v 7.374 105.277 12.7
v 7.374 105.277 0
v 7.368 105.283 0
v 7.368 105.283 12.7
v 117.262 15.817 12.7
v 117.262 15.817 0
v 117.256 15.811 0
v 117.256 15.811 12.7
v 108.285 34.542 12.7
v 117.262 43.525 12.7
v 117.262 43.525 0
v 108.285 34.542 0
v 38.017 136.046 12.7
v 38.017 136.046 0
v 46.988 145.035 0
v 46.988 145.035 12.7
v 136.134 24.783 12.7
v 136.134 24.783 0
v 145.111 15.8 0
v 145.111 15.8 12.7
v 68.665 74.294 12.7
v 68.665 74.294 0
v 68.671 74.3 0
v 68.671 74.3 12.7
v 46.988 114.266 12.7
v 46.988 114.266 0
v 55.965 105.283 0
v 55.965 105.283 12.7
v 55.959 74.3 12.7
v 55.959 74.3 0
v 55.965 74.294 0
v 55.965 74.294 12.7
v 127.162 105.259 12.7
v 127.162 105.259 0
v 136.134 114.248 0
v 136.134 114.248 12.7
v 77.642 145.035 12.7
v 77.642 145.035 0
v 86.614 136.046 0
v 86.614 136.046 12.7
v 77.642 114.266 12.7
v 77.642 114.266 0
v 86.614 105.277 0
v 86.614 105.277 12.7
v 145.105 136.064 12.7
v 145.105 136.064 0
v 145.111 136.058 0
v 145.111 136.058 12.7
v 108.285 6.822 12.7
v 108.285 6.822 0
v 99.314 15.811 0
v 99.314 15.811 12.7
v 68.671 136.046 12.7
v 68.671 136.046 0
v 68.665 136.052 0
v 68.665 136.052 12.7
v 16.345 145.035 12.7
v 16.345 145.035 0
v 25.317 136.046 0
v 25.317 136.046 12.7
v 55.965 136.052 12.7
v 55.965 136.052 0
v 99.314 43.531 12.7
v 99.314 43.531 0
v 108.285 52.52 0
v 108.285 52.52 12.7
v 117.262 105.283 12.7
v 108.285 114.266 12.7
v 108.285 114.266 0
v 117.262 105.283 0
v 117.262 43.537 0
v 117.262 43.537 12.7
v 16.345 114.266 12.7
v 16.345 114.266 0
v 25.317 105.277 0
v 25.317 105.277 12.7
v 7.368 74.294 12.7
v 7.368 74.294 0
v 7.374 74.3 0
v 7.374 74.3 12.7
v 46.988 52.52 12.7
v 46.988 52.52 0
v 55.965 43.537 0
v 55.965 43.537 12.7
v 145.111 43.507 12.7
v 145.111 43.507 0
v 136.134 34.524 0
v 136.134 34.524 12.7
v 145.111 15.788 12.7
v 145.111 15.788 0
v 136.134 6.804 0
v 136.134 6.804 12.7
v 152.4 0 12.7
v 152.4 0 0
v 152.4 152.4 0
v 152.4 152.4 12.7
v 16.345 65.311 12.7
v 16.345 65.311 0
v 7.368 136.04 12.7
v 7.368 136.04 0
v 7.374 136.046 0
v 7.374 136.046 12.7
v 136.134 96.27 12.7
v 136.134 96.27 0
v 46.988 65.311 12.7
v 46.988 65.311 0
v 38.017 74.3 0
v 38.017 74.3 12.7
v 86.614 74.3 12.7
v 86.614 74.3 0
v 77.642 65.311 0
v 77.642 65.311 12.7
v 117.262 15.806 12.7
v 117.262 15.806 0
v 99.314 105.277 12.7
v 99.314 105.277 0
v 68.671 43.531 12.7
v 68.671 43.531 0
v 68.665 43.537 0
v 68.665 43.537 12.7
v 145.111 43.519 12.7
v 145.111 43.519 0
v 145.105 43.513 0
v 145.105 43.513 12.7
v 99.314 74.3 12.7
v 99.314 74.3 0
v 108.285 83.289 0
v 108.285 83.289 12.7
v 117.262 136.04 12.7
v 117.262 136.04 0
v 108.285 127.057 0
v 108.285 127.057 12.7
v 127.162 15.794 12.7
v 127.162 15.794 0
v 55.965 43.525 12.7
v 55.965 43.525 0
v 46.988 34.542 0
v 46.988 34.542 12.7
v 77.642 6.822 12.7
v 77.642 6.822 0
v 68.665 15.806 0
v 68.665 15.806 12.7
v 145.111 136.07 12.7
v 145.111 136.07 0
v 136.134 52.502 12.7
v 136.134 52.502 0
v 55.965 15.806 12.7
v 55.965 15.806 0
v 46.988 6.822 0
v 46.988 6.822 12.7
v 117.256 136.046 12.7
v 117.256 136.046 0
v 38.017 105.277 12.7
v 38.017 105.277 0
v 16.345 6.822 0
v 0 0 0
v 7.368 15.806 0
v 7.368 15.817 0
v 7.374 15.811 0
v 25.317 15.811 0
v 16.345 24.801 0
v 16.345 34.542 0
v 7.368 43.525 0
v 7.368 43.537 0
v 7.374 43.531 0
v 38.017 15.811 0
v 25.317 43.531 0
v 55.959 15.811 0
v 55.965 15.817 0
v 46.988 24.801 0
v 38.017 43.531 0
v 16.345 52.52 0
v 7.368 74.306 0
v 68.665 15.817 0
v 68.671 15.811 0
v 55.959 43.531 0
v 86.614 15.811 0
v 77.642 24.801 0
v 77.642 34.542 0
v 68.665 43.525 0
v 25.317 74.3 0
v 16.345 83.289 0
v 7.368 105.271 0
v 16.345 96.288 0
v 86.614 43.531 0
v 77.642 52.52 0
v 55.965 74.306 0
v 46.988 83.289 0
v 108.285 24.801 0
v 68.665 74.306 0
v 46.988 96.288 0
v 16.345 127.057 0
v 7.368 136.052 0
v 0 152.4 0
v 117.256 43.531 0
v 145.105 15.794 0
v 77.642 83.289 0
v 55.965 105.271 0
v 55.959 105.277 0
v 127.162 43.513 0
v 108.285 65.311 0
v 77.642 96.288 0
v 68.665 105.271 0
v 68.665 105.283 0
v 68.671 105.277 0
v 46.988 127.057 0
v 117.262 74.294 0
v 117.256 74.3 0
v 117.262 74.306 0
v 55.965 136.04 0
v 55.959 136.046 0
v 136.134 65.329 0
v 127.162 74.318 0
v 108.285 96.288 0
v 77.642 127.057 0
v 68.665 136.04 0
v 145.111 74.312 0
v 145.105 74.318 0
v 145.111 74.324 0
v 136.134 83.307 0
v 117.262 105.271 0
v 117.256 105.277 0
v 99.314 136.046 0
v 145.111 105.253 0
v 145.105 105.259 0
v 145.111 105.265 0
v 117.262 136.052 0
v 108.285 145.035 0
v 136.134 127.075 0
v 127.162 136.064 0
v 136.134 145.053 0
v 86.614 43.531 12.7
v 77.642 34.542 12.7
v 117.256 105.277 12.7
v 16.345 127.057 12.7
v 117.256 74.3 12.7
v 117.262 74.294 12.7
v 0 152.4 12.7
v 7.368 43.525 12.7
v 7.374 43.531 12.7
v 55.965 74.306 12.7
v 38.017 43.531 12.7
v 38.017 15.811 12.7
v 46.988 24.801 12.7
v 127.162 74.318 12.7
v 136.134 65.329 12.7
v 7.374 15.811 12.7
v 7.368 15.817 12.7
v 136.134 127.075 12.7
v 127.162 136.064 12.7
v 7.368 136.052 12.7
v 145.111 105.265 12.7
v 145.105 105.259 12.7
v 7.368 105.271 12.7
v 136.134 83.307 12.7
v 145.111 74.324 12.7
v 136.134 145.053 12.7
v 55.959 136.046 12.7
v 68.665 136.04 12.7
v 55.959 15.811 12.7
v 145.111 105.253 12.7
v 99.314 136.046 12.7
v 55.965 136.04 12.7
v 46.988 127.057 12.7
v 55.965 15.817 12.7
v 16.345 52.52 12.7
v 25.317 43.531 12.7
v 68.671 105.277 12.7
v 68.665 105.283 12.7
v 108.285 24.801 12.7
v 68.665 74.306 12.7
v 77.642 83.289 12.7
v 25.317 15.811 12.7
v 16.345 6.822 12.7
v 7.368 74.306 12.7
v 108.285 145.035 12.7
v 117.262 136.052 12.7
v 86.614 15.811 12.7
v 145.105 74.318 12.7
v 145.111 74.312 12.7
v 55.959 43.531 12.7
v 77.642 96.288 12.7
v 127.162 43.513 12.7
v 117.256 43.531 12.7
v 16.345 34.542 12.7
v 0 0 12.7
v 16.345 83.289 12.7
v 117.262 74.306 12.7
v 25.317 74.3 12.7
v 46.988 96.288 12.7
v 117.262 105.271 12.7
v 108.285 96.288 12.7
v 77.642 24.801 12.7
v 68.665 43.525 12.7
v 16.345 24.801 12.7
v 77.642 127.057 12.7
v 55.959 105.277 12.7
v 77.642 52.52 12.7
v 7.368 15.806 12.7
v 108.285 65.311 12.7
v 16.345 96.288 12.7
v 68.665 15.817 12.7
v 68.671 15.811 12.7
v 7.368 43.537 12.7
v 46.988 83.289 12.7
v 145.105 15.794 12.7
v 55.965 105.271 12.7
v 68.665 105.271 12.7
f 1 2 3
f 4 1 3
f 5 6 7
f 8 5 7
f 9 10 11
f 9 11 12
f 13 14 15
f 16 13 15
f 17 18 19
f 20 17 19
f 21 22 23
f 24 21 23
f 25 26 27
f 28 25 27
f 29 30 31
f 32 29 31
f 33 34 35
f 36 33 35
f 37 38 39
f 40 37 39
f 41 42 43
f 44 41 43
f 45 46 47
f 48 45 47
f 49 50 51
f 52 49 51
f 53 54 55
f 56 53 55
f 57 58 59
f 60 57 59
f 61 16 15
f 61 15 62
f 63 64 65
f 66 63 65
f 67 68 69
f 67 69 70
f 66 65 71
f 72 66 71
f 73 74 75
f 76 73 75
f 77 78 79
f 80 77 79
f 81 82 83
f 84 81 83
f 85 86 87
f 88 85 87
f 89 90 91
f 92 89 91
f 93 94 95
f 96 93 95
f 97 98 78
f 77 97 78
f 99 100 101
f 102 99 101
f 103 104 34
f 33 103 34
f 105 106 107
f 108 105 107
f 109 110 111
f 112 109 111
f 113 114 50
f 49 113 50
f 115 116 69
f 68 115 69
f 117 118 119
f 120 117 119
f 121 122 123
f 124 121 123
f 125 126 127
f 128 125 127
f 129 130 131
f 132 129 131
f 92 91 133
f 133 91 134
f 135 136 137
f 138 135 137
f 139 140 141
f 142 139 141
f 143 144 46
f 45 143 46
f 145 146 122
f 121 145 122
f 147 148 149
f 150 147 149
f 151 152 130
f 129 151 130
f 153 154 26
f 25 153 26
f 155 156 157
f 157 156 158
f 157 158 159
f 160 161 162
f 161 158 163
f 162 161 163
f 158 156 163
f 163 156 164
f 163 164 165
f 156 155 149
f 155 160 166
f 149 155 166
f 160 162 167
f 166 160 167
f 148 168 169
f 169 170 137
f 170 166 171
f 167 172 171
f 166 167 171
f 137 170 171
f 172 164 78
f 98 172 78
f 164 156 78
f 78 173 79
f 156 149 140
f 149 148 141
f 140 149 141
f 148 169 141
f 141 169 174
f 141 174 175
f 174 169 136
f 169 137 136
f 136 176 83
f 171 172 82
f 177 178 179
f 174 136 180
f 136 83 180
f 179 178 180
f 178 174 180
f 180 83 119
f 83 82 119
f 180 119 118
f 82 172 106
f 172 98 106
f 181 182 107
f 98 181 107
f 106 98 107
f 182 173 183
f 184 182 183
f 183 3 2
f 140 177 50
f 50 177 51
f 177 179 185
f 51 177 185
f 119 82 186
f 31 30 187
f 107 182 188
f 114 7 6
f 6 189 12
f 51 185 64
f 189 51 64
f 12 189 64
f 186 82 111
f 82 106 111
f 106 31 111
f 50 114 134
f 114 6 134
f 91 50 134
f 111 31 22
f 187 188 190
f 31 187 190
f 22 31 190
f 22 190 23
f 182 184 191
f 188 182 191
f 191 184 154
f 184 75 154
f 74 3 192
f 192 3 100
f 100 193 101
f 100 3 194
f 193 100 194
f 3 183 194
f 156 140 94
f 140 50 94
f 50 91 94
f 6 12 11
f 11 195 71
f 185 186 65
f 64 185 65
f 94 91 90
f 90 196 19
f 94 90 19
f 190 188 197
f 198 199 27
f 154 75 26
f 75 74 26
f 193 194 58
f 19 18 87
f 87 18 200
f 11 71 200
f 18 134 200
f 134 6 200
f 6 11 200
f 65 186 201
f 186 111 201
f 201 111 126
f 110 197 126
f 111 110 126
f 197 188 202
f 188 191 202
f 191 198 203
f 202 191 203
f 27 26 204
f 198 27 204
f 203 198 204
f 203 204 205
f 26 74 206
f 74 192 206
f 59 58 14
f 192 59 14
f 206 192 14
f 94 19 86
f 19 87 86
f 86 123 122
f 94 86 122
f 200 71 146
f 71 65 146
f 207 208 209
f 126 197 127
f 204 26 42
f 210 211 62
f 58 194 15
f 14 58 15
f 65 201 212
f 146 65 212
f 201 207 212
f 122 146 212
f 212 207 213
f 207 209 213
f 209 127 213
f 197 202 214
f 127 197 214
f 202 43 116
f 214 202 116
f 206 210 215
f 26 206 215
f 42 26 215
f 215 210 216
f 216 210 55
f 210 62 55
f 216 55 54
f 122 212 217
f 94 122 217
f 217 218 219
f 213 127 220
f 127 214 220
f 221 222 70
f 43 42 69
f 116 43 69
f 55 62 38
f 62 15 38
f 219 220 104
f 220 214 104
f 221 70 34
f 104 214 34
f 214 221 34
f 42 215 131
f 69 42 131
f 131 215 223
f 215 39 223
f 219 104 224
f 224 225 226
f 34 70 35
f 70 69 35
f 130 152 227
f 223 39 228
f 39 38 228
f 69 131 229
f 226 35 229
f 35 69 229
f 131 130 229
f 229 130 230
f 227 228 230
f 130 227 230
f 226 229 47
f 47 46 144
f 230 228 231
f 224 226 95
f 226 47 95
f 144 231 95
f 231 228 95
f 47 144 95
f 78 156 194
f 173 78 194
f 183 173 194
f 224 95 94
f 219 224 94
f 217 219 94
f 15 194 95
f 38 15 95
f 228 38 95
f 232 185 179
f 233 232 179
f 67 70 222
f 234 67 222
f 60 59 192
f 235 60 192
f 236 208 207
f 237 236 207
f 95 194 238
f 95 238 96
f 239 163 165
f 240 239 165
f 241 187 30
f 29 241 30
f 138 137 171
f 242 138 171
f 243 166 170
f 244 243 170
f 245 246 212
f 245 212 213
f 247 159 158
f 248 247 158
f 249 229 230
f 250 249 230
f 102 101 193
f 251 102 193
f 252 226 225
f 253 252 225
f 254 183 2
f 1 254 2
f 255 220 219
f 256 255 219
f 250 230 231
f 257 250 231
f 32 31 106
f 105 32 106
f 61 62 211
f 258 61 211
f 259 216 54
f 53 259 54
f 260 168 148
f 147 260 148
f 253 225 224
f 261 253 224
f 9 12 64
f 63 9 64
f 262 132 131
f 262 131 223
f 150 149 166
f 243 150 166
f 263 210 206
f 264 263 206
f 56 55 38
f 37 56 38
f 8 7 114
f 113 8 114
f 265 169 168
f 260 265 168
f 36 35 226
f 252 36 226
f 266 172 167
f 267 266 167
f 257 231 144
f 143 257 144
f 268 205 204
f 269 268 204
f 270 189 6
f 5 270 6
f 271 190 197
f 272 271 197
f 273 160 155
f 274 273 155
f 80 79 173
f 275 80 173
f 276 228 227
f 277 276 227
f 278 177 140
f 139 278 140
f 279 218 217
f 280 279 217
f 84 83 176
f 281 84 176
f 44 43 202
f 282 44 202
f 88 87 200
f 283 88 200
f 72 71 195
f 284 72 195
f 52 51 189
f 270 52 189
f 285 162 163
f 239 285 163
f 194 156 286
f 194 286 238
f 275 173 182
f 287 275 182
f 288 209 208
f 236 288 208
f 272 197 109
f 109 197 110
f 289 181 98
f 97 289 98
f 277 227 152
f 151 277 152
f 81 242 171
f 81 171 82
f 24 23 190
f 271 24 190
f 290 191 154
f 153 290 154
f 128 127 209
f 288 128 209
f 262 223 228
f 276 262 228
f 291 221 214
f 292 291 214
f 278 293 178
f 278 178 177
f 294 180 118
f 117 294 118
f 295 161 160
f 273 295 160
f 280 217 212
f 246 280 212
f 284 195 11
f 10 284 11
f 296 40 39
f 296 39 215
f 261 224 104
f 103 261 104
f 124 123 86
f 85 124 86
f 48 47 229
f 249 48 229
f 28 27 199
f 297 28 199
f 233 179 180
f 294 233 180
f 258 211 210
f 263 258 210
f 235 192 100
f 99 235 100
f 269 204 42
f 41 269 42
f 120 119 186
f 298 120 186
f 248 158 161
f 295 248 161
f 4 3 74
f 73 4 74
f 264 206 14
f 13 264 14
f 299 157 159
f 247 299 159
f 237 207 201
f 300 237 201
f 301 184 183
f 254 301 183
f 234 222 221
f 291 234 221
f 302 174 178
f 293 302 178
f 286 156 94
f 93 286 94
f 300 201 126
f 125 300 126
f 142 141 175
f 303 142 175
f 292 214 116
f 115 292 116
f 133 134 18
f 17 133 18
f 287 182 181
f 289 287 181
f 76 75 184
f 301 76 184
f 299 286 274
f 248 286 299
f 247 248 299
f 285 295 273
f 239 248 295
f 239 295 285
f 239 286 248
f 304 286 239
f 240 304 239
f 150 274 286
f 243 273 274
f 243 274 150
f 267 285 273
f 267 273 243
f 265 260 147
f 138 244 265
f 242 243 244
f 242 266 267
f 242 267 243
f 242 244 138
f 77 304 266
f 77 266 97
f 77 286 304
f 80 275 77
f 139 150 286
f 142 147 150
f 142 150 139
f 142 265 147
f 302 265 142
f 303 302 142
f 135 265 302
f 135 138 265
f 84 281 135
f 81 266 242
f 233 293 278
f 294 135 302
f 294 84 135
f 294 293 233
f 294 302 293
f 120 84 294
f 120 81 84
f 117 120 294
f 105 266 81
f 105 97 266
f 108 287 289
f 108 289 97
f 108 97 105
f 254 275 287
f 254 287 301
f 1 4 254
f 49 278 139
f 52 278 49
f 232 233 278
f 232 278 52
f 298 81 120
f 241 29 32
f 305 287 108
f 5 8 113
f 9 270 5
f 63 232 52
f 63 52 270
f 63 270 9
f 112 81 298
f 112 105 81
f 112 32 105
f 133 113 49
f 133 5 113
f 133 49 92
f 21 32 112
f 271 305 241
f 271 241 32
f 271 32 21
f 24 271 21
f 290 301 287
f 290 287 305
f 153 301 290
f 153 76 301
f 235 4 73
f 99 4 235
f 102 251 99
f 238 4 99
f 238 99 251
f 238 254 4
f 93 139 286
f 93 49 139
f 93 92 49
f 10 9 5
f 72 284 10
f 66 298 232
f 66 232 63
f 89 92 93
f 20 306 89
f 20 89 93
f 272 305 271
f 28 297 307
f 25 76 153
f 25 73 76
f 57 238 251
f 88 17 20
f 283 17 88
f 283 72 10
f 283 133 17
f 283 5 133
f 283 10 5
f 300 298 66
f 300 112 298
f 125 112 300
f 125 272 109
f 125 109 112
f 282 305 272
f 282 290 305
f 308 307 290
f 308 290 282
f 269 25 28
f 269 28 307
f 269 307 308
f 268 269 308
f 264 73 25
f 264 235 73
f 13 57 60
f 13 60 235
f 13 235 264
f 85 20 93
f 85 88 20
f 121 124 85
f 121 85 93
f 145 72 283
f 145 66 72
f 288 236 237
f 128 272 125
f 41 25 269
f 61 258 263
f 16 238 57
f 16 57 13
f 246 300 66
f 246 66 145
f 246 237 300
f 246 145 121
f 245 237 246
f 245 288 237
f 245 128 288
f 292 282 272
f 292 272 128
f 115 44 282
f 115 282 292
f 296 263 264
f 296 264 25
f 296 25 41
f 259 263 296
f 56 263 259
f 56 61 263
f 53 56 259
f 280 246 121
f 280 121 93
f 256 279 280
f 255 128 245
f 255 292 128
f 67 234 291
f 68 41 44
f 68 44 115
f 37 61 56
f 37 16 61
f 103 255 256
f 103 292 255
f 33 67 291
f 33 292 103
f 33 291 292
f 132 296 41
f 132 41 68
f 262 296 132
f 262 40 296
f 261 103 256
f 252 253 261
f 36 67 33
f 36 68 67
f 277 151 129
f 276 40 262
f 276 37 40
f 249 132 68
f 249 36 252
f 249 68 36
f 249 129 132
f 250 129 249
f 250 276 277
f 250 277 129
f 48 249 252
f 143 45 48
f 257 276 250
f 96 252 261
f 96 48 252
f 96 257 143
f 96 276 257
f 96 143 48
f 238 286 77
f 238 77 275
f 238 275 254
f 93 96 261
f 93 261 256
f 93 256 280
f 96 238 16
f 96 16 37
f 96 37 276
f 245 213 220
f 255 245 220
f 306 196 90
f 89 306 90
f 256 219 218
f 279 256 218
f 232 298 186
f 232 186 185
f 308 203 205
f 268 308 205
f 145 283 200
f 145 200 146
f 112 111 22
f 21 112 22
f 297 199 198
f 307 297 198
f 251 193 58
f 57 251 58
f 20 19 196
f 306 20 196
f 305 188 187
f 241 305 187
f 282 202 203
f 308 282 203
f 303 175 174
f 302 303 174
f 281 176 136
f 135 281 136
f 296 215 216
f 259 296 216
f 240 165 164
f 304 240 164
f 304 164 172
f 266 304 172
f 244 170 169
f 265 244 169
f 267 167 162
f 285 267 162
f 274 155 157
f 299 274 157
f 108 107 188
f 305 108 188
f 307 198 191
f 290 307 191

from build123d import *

# Parameters (mm, degrees)
F0_W     = 152.4
F0_H     = 152.4
F1_DEPTH = 12.7


with BuildPart() as f1:
    # F0 (on Top) → F1 (new body)
    with BuildSketch(Plane.XY):
        with Locations((76.2, 76.2)):
            Rectangle(F0_W, F0_H)
        Polygon((16.345332, 24.800697), (25.316621, 15.811483), (16.345332, 6.822268), (7.368064, 15.805512), (7.374039, 15.811483), (7.368064, 15.817454), align=None, mode=Mode.SUBTRACT)
        Polygon((16.345333, 52.520424), (25.316622, 43.53121), (16.345333, 34.541995), (7.368065, 43.525238), (7.374041, 43.53121), (7.368065, 43.537181), align=None, mode=Mode.SUBTRACT)
        Polygon((55.959203, 15.811483), (55.965178, 15.805512), (46.98791, 6.822268), (38.016621, 15.811483), (46.98791, 24.800697), (55.965178, 15.817454), align=None, mode=Mode.SUBTRACT)
        Polygon((77.642446, 24.800697), (86.613735, 15.811483), (77.642446, 6.822268), (68.665178, 15.805512), (68.671153, 15.811483), (68.665178, 15.817454), align=None, mode=Mode.SUBTRACT)
        Polygon((108.285023, 6.822268), (99.313735, 15.811483), (108.285023, 24.800697), (117.262291, 15.817454), (117.256316, 15.811483), (117.262291, 15.805512), align=None, mode=Mode.SUBTRACT)
        Polygon((145.104813, 15.793557), (145.110789, 15.787586), (136.133521, 6.804342), (127.162232, 15.793557), (136.133521, 24.782771), (145.110789, 15.799528), align=None, mode=Mode.SUBTRACT)
        Polygon((55.959204, 43.53121), (55.965179, 43.525238), (46.987911, 34.541995), (38.016622, 43.53121), (46.987911, 52.520424), (55.965179, 43.537181), align=None, mode=Mode.SUBTRACT)
        Polygon((77.642447, 52.520424), (86.613736, 43.53121), (77.642447, 34.541995), (68.665179, 43.525238), (68.671154, 43.53121), (68.665179, 43.537181), align=None, mode=Mode.SUBTRACT)
        Polygon((108.285025, 34.541995), (99.313736, 43.53121), (108.285025, 52.520424), (117.262293, 43.537181), (117.256317, 43.53121), (117.262293, 43.525238), align=None, mode=Mode.SUBTRACT)
        Polygon((145.104815, 43.513284), (145.11079, 43.507312), (136.133522, 34.524069), (127.162233, 43.513284), (136.133522, 52.502498), (145.11079, 43.519255), align=None, mode=Mode.SUBTRACT)
        Polygon((16.345333, 83.289459), (25.316622, 74.300244), (16.345333, 65.31103), (7.368065, 74.294273), (7.374041, 74.300244), (7.368065, 74.306215), align=None, mode=Mode.SUBTRACT)
        Polygon((16.345333, 114.266112), (25.316622, 105.276898), (16.345333, 96.287683), (7.368065, 105.270927), (7.374041, 105.276898), (7.368065, 105.282869), align=None, mode=Mode.SUBTRACT)
        Polygon((25.316622, 136.045932), (16.345333, 127.056718), (7.368065, 136.039961), (7.374041, 136.045932), (7.368065, 136.051904), (16.345333, 145.035147), align=None, mode=Mode.SUBTRACT)
        Polygon((38.016622, 74.300244), (46.987911, 83.289459), (55.965179, 74.306215), (55.959204, 74.300244), (55.965179, 74.294273), (46.987911, 65.31103), align=None, mode=Mode.SUBTRACT)
        Polygon((68.665179, 74.306215), (77.642447, 83.289459), (86.613736, 74.300244), (77.642447, 65.31103), (68.665179, 74.294273), (68.671154, 74.300244), align=None, mode=Mode.SUBTRACT)
        Polygon((46.987911, 96.287683), (38.016622, 105.276898), (46.987911, 114.266112), (55.965179, 105.282869), (55.959204, 105.276898), (55.965179, 105.270927), align=None, mode=Mode.SUBTRACT)
        Polygon((77.642447, 114.266112), (86.613736, 105.276898), (77.642447, 96.287683), (68.665179, 105.270927), (68.671154, 105.276898), (68.665179, 105.282869), align=None, mode=Mode.SUBTRACT)
        Polygon((108.285025, 65.31103), (99.313736, 74.300244), (108.285025, 83.289459), (117.262293, 74.306215), (117.256317, 74.300244), (117.262293, 74.294273), align=None, mode=Mode.SUBTRACT)
        Polygon((136.133522, 65.328956), (127.162233, 74.31817), (136.133522, 83.307385), (145.11079, 74.324141), (145.104815, 74.31817), (145.11079, 74.312199), align=None, mode=Mode.SUBTRACT)
        Polygon((108.285025, 114.266112), (117.262293, 105.282869), (117.256317, 105.276898), (117.262293, 105.270927), (108.285025, 96.287683), (99.313736, 105.276898), align=None, mode=Mode.SUBTRACT)
        Polygon((136.133522, 114.248186), (145.11079, 105.264943), (145.104815, 105.258972), (145.11079, 105.253001), (136.133522, 96.269757), (127.162233, 105.258972), align=None, mode=Mode.SUBTRACT)
        Polygon((46.987911, 127.056718), (38.016622, 136.045932), (46.987911, 145.035147), (55.965179, 136.051904), (55.959204, 136.045932), (55.965179, 136.039961), align=None, mode=Mode.SUBTRACT)
        Polygon((77.642447, 127.056718), (68.665179, 136.039961), (68.671154, 136.045932), (68.665179, 136.051904), (77.642447, 145.035147), (86.613736, 136.045932), align=None, mode=Mode.SUBTRACT)
        Polygon((108.285025, 127.056718), (99.313736, 136.045932), (108.285025, 145.035147), (117.262293, 136.051904), (117.256317, 136.045932), (117.262293, 136.039961), align=None, mode=Mode.SUBTRACT)
        Polygon((136.133522, 127.074644), (127.162233, 136.063858), (136.133522, 145.053073), (145.11079, 136.06983), (145.104815, 136.063858), (145.11079, 136.057887), align=None, mode=Mode.SUBTRACT)
    extrude(amount=F1_DEPTH)


solid = f1.part
